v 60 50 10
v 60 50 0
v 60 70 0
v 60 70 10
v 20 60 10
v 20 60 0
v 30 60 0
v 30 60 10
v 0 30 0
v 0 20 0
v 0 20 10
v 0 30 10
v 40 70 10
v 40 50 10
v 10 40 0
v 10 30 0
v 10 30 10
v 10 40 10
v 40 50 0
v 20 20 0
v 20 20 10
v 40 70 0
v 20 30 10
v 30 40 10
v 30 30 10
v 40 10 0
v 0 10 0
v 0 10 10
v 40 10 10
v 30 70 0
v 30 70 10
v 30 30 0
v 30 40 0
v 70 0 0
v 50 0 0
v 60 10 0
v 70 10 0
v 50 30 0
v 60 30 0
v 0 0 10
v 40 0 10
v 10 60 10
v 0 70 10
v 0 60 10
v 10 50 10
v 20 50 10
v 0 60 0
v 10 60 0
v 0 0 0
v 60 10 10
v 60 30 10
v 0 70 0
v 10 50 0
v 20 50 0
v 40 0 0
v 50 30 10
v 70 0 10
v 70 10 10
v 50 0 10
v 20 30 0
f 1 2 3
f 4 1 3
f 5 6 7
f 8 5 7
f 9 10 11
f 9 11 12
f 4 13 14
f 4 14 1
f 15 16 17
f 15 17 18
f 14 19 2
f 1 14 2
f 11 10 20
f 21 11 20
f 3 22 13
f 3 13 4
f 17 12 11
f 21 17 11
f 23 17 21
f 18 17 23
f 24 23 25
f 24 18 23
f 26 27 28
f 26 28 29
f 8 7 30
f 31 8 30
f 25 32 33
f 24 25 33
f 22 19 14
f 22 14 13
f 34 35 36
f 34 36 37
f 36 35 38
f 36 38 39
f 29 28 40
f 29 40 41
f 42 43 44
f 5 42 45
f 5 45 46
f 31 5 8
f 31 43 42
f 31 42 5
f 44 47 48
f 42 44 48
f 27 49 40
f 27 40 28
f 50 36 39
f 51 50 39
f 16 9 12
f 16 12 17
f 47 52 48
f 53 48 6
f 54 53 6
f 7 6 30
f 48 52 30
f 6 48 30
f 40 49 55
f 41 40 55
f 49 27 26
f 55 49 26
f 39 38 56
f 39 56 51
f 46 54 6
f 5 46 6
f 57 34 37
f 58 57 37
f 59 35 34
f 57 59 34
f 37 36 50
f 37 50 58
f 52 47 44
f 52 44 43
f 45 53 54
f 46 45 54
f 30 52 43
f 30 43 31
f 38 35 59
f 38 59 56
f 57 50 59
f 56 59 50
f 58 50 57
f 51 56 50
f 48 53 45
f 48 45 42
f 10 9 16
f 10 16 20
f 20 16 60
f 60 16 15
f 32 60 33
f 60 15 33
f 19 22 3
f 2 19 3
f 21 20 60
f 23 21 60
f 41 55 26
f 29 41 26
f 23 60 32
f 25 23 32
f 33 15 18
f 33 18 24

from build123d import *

# Parameters (mm, degrees)
BOX_W        = 40
BOX_H        = 10
BOX_DEPTH    = 10
BOX001_W     = 20
BOX001_H     = 10
BOX001_DEPTH = 10
BOX002_W     = 20
BOX002_H     = 10
BOX002_DEPTH = 10
BOX003_W     = 10
BOX003_H     = 10
BOX003_DEPTH = 10
BOX004_W     = 30
BOX004_H     = 10
BOX004_DEPTH = 10
BOX005_W     = 20
BOX005_H     = 20
BOX005_DEPTH = 10
BOX006_W     = 20
BOX006_H     = 10
BOX006_DEPTH = 10
BOX007_W     = 10
BOX007_H     = 30
BOX007_DEPTH = 10


with BuildPart() as cubo:
    # Box → Box (new body)
    with BuildSketch(Plane.XY):
        with Locations((20, 5)):
            Rectangle(BOX_W, BOX_H)
    extrude(amount=BOX_DEPTH)


with BuildPart() as cubo001:
    # Box001 → Box001 (new body)
    with BuildSketch(Plane(origin=(0, 20, 0), x_dir=(1, 0, 0), z_dir=(0, 0, 1))):
        with Locations((10, 5)):
            Rectangle(BOX001_W, BOX001_H)
    extrude(amount=BOX001_DEPTH)


with BuildPart() as fusion:
    # Box002 → Box002 (new body)
    with BuildSketch(Plane(origin=(10, 30, 0), x_dir=(1, 0, 0), z_dir=(0, 0, 1))):
        with Locations((10, 5)):
            Rectangle(BOX002_W, BOX002_H)
    extrude(amount=BOX002_DEPTH)

    # Fusion: union Cubo001
    add(cubo001.part)


with BuildPart() as cubo003:
    # Box003 → Box003 (new body)
    with BuildSketch(Plane(origin=(10, 50, 0), x_dir=(1, 0, 0), z_dir=(0, 0, 1))):
        with Locations((5, 5)):
            Rectangle(BOX003_W, BOX003_H)
    extrude(amount=BOX003_DEPTH)


with BuildPart() as fusion001:
    # Box004 → Box004 (new body)
    with BuildSketch(Plane(origin=(0, 60, 0), x_dir=(1, 0, 0), z_dir=(0, 0, 1))):
        with Locations((15, 5)):
            Rectangle(BOX004_W, BOX004_H)
    extrude(amount=BOX004_DEPTH)

    # Fusion001: union Cubo003
    add(cubo003.part)


with BuildPart() as cubo005:
    # Box005 → Box005 (new body)
    with BuildSketch(Plane(origin=(40, 50, 0), x_dir=(1, 0, 0), z_dir=(0, 0, 1))):
        with Locations((10, 10)):
            Rectangle(BOX005_W, BOX005_H)
    extrude(amount=BOX005_DEPTH)


with BuildPart() as cubo006:
    # Box006 → Box006 (new body)
    with BuildSketch(Plane(origin=(50, 0, 0), x_dir=(1, 0, 0), z_dir=(0, 0, 1))):
        with Locations((10, 5)):
            Rectangle(BOX006_W, BOX006_H)
    extrude(amount=BOX006_DEPTH)


with BuildPart() as fusion002:
    # Box007 → Box007 (new body)
    with BuildSketch(Plane(origin=(50, 0, 0), x_dir=(1, 0, 0), z_dir=(0, 0, 1))):
        with Locations((5, 15)):
            Rectangle(BOX007_W, BOX007_H)
    extrude(amount=BOX007_DEPTH)

    # Fusion002: union Cubo006
    add(cubo006.part)


solid = Compound([cubo.part, fusion.part, fusion001.part, cubo005.part, fusion002.part])
